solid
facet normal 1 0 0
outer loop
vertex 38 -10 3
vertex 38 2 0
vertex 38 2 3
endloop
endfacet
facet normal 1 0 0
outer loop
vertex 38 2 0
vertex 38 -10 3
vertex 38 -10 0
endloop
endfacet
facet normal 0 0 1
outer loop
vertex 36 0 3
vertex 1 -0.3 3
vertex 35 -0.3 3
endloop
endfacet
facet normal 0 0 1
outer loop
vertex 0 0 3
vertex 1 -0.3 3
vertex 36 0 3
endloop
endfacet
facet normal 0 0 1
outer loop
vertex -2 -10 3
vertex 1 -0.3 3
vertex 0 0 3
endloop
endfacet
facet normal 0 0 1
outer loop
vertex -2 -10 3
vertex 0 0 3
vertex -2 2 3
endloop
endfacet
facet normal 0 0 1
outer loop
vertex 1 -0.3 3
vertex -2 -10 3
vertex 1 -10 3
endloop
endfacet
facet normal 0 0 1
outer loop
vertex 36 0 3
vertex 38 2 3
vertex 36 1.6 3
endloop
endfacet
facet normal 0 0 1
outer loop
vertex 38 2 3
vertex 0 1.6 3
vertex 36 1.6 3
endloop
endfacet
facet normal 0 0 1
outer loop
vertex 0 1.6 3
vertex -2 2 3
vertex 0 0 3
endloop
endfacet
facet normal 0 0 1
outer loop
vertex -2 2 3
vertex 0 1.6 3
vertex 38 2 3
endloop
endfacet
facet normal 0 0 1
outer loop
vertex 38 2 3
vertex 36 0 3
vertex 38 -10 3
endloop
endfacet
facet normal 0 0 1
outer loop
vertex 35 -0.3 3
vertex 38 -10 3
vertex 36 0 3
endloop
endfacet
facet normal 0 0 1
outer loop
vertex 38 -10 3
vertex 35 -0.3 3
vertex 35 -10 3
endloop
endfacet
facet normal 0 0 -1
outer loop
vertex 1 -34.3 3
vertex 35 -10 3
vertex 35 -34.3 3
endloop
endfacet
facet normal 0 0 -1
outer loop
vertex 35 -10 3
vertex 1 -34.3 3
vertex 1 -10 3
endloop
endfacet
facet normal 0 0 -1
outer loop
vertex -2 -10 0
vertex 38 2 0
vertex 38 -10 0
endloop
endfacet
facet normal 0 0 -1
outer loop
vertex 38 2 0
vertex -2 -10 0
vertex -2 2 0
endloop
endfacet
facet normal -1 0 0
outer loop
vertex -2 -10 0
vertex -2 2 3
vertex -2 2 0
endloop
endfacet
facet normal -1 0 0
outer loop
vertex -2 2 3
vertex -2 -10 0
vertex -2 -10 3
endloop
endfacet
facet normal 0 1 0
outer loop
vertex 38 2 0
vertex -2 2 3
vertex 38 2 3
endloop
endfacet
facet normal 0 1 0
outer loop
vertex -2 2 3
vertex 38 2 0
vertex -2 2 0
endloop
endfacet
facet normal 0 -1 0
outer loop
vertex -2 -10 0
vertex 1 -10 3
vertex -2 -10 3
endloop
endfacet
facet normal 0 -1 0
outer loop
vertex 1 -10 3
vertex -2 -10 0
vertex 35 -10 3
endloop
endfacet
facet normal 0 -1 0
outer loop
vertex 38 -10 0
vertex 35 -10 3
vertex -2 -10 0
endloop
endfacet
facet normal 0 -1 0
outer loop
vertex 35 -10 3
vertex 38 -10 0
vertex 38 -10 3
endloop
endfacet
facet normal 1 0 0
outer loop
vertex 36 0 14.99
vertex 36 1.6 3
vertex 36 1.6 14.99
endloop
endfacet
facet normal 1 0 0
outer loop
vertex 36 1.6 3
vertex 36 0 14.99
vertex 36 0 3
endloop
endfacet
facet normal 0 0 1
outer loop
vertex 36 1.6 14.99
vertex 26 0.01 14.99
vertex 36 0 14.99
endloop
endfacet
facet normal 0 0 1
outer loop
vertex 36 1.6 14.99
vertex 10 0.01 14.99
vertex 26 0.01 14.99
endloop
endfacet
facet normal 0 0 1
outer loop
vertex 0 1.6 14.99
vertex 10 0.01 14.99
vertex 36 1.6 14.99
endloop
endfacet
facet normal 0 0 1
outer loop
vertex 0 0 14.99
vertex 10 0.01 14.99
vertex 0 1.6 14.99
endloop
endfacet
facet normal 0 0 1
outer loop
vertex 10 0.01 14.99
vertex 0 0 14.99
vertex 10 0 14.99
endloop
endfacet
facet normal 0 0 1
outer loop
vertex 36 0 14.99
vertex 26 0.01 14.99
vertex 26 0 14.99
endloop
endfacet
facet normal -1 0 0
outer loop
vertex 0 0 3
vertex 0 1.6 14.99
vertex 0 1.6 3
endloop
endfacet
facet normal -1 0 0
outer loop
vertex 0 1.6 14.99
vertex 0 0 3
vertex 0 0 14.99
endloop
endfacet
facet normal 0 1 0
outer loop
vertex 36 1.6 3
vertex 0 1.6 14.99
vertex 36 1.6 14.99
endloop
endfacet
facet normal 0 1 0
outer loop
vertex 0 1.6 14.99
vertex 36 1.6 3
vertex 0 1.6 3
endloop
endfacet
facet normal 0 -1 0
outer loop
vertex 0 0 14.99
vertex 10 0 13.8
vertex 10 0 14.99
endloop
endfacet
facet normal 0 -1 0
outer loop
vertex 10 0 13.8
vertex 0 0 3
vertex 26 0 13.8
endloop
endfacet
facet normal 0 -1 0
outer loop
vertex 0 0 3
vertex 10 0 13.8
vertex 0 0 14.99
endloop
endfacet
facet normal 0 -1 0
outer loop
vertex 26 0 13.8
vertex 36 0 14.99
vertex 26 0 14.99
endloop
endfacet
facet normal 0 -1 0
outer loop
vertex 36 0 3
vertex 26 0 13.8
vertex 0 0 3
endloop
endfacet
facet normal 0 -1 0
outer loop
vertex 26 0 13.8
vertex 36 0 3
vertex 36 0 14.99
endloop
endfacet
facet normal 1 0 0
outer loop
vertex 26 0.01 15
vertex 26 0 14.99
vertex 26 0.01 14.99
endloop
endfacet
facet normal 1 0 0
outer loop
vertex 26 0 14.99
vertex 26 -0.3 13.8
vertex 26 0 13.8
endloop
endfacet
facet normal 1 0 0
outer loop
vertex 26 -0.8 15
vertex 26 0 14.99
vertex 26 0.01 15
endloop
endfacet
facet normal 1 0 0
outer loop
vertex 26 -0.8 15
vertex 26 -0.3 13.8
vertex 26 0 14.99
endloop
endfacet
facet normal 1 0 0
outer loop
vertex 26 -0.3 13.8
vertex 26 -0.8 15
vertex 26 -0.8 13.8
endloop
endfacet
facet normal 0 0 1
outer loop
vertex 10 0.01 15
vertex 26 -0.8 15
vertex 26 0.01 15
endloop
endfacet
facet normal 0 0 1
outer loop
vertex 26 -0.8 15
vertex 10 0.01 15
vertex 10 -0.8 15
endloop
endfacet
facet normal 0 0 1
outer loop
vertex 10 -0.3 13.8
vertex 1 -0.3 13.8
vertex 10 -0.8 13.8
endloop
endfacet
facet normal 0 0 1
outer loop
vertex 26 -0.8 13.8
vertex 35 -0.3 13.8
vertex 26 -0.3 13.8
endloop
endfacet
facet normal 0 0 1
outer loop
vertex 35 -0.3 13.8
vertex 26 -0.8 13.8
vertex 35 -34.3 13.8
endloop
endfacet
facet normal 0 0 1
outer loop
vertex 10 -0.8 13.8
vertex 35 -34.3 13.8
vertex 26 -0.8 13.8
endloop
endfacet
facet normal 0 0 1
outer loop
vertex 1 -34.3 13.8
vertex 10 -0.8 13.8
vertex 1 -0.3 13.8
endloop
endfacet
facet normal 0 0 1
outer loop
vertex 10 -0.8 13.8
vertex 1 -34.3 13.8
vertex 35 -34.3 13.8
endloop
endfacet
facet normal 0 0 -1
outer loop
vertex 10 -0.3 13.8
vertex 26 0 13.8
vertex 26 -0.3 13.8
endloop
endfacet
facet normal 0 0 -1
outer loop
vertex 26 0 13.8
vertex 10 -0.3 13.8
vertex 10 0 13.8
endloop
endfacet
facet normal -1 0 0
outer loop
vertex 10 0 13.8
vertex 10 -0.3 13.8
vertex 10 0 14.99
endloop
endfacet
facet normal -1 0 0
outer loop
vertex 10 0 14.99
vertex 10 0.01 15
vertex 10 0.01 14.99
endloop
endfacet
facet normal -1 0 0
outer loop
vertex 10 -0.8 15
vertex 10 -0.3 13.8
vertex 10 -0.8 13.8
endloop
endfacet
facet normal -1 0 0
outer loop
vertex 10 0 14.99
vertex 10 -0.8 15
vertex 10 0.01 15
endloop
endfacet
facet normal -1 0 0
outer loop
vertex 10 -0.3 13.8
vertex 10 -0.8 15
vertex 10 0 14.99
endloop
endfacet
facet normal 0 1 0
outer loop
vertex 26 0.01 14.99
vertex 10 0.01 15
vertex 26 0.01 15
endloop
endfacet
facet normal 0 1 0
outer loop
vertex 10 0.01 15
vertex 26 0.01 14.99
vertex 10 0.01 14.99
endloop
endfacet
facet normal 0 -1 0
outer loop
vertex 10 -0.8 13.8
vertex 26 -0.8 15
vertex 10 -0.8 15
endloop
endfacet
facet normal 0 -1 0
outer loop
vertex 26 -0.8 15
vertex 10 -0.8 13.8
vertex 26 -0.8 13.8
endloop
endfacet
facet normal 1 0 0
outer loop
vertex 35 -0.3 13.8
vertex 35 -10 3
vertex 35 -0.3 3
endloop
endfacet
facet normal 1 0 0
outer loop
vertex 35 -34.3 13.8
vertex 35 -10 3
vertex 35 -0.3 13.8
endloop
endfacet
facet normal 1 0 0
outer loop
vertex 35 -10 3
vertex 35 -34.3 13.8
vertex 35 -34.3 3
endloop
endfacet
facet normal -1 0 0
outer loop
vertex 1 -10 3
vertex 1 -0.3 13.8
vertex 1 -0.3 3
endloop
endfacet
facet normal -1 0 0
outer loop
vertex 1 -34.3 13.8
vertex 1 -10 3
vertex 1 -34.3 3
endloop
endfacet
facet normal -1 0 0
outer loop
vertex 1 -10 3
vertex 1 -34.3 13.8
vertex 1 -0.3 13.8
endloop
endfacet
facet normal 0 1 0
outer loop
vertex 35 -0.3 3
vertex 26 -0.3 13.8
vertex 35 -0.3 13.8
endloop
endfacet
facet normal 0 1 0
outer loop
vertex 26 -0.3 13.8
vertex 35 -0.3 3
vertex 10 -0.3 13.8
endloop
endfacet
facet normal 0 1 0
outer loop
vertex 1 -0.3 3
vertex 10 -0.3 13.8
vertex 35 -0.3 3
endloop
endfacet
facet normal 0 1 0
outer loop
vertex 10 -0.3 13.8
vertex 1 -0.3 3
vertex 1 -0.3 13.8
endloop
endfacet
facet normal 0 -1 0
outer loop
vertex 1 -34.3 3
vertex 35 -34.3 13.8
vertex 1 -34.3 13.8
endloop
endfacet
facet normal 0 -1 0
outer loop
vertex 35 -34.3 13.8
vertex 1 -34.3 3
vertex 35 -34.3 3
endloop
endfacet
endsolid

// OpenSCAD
// file: _review.scad
// Shared by the review protos: the colours of a before/after pair.  The part in a neutral grey-blue, the
// geometry a proposal changes in the accent, the parts it mates with in a translucent grey.
NEUTRAL = "#b9c6d6";
ACCENT = "#ff7a1a";
MATE = "#6f7782";
MATE_A = 0.45;
PCB = "#2f6f4f";
module part() color(NEUTRAL) children();
module changed() color(ACCENT) children();
module mate(a = MATE_A) color(MATE, a) children();
// main file
// Review proto (not a part): one wall of the camera pod's sleeve with the Mega's case in it (grey,
// translucent), printed as the pod is (upside down: the wall stands on the plate, the lip at its far end).
// Today: a rigid 1.6 mm wall with a 0.8 mm lip, bent across its layers each time the case goes in or out:
// 1.3 % (FEM 42 MPa), allowed 0.5 % for repeated use.  Proposed (accent): a tab 16 × 10 cut on three sides
// (0.6 slits), hinged on a vertical edge, a 0.5 mm lip on its free end: it bends in the print plane, 0.75 %.
// docs/printed-parts-review.md › Camera pod.
//
//   openscad -D 'VIEW="today"' -o sleeve_tab_today.png mechanical/review/proto/sleeve_tab.scad
include <_review.scad>
VIEW = "today";
SW = 1.6; W = 36; H = 12; PLATE = 3; LIP = 0.8; FIT = 0.3;
module plate() translate([-2, -10, 0]) cube([W + 4, 12, PLATE]);
module wall() translate([0, 0, PLATE - 0.01]) cube([W, SW, H]);
module lip_today() translate([W / 2 - 8, -LIP, PLATE + H - 1.2]) cube([16, LIP + 0.01, 1.2]);
module tab_cuts() {
    translate([W / 2 - 8 + 16, -1, PLATE + 1]) cube([0.6, SW + 2, 10]);
    translate([W / 2 - 8, -1, PLATE + 1]) cube([16.6, SW + 2, 0.6]);
    translate([W / 2 - 8, -1, PLATE + 1 + 10 - 0.6]) cube([16.6, SW + 2, 0.6]);
}
module tab_region() translate([W / 2 - 8 - 0.3, -1.5, PLATE + 1 - 0.3]) cube([16.9, SW + 3, 10.6]);
module lip_tab() translate([W / 2 - 8 + 10, -0.5, PLATE + 1 + 2]) cube([5.5, 0.51, 6]);
// the camera's case against the wall, its lens face at the top (printed upside down: the case goes in from above)
module case() mate(0.4) translate([1, -FIT - 34, PLATE]) cube([W - 2, 34, H - 1.2]);

if (VIEW == "today") { part() { plate(); wall(); lip_today(); } case(); }
else {
    part() { plate(); difference() { wall(); tab_cuts(); tab_region(); } }
    changed() { difference() { intersection() { wall(); tab_region(); } tab_cuts(); } lip_tab(); }
    case();
}
